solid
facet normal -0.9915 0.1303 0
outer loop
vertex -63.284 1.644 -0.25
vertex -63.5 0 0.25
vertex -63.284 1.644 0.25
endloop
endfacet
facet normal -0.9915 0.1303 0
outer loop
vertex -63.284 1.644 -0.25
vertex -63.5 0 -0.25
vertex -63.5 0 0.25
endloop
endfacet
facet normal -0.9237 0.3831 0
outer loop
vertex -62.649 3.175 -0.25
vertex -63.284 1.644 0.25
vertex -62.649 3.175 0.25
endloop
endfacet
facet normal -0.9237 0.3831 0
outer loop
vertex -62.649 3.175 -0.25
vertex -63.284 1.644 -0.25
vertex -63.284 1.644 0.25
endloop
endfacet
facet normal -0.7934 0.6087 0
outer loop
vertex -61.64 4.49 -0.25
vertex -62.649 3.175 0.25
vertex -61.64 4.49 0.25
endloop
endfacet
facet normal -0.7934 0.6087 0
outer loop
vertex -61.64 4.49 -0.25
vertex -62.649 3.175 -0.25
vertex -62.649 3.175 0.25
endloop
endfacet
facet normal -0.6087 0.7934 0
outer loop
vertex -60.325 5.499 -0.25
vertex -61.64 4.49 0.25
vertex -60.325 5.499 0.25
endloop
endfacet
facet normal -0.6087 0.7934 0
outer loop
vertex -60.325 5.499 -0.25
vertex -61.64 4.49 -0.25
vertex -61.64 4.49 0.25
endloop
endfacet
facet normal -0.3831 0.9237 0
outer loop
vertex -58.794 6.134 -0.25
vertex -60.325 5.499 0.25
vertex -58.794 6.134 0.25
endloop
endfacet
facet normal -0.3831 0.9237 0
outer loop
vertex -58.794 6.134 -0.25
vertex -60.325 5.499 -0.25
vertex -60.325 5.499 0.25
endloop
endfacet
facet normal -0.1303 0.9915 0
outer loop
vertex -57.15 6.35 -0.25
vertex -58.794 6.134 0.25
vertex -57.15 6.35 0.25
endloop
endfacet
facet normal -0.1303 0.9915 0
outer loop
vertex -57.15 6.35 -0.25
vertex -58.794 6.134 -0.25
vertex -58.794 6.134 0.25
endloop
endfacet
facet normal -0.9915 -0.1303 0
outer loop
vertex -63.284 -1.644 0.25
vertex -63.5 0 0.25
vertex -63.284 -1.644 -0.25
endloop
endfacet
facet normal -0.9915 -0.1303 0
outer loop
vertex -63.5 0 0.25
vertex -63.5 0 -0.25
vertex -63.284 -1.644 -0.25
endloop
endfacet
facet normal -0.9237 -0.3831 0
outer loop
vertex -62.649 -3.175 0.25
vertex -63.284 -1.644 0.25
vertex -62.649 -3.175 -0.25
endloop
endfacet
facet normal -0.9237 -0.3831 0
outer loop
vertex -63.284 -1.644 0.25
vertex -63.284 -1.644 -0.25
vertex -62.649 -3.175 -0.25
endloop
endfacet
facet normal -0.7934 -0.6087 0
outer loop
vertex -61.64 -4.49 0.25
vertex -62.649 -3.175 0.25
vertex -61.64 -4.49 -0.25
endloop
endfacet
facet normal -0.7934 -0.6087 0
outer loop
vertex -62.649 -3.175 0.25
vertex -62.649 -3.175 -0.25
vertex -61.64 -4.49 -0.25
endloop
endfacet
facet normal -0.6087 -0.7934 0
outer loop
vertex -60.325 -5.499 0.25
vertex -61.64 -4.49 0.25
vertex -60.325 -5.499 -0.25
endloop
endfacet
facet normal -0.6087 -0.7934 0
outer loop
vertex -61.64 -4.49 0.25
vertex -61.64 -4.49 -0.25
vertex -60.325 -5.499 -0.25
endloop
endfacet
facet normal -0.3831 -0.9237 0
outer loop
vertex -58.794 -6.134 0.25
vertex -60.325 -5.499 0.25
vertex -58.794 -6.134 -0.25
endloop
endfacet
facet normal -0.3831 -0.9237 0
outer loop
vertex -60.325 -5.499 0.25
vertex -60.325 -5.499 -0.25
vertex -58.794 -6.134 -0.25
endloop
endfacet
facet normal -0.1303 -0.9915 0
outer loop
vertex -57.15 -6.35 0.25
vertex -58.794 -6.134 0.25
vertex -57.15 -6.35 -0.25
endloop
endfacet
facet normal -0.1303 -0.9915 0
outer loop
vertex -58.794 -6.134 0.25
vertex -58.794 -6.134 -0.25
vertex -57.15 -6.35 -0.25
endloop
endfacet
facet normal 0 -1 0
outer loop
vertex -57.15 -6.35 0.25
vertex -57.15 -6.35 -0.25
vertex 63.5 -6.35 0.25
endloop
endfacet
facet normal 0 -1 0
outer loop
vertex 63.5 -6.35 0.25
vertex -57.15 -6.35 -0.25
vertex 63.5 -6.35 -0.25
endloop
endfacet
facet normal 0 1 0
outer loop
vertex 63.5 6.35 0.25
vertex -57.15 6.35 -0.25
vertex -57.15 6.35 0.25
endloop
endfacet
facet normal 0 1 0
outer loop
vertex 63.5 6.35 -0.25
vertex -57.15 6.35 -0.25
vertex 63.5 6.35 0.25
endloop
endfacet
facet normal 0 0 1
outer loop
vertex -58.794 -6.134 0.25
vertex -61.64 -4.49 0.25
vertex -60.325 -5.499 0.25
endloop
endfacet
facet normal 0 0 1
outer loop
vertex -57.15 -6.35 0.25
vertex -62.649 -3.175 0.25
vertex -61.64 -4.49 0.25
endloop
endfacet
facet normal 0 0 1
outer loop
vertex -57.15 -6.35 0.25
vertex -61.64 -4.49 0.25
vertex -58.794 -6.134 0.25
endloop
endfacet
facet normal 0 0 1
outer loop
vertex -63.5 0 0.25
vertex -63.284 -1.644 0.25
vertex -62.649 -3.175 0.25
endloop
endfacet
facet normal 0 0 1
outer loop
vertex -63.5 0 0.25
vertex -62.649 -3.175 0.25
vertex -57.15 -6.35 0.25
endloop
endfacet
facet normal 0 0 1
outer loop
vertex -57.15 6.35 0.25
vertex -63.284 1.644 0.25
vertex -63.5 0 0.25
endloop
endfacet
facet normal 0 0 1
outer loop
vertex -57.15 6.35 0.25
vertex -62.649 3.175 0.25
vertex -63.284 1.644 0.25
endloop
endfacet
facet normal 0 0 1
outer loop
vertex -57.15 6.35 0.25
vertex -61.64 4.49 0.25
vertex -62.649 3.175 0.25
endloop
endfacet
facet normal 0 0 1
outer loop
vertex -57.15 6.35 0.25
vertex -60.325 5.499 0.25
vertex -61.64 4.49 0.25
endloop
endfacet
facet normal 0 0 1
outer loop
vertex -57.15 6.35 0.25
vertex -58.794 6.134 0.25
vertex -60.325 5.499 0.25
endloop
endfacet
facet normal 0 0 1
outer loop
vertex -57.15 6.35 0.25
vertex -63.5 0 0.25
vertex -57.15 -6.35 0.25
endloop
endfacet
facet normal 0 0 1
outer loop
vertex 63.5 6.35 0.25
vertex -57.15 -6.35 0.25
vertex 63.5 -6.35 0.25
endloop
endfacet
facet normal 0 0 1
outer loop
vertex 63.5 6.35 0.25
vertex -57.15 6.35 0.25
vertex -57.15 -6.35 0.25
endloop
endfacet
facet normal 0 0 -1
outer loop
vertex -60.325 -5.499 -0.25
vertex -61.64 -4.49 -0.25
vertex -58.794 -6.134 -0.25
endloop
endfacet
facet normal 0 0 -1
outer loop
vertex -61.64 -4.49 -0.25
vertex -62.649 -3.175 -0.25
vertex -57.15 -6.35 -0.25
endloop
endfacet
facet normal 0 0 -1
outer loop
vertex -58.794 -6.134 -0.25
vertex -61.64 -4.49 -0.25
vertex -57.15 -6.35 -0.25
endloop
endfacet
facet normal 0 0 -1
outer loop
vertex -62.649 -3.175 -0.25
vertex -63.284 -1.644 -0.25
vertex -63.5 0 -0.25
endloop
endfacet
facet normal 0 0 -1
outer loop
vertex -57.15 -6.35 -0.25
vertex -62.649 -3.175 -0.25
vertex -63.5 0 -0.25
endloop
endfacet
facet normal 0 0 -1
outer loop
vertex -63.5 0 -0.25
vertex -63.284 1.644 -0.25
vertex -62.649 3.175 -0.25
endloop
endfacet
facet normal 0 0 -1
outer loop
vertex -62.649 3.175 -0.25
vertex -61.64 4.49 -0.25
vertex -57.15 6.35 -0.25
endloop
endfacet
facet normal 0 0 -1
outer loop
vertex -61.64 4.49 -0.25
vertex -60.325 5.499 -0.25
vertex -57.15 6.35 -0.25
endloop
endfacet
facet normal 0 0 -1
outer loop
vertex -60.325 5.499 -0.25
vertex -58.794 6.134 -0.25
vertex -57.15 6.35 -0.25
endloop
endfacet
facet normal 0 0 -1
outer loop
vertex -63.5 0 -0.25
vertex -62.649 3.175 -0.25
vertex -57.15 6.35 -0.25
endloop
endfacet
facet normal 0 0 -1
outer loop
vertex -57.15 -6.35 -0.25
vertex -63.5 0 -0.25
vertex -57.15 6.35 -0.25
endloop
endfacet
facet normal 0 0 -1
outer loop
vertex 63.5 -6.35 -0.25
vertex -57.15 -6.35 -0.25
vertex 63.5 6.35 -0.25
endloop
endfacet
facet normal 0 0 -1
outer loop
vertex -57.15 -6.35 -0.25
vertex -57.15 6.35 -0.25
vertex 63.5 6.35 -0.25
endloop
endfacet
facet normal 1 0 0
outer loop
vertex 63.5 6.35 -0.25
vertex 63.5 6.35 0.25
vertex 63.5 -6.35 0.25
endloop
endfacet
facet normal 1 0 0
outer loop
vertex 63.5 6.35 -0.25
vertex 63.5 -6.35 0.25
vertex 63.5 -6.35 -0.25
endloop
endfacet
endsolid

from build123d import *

# Parameters (mm, degrees)
SKETCH1_W          = 127
SKETCH1_H          = 0.5
BASE_EXTRUDE_DEPTH = 6.35
FILLET1_R          = 6.35


with BuildPart() as part:
    # Sketch1 → Base-Extrude (new, symmetric)
    with BuildSketch(Plane(origin=(0, 0, 0), x_dir=(1, 0, 0), z_dir=(0, 1, 0))):
        Rectangle(SKETCH1_W, SKETCH1_H)
    extrude(amount=BASE_EXTRUDE_DEPTH, both=True)

    # Fillet1
    fillet1_edges = [part.edges().sort_by_distance(p)[0] for p in [
        (-63.5, 6.35, 0),
        (-63.5, -6.35, 0),
    ]]
    fillet(fillet1_edges, radius=FILLET1_R - 0.0001)  # a hair under: the kernel refuses the full size


solid = part.part
